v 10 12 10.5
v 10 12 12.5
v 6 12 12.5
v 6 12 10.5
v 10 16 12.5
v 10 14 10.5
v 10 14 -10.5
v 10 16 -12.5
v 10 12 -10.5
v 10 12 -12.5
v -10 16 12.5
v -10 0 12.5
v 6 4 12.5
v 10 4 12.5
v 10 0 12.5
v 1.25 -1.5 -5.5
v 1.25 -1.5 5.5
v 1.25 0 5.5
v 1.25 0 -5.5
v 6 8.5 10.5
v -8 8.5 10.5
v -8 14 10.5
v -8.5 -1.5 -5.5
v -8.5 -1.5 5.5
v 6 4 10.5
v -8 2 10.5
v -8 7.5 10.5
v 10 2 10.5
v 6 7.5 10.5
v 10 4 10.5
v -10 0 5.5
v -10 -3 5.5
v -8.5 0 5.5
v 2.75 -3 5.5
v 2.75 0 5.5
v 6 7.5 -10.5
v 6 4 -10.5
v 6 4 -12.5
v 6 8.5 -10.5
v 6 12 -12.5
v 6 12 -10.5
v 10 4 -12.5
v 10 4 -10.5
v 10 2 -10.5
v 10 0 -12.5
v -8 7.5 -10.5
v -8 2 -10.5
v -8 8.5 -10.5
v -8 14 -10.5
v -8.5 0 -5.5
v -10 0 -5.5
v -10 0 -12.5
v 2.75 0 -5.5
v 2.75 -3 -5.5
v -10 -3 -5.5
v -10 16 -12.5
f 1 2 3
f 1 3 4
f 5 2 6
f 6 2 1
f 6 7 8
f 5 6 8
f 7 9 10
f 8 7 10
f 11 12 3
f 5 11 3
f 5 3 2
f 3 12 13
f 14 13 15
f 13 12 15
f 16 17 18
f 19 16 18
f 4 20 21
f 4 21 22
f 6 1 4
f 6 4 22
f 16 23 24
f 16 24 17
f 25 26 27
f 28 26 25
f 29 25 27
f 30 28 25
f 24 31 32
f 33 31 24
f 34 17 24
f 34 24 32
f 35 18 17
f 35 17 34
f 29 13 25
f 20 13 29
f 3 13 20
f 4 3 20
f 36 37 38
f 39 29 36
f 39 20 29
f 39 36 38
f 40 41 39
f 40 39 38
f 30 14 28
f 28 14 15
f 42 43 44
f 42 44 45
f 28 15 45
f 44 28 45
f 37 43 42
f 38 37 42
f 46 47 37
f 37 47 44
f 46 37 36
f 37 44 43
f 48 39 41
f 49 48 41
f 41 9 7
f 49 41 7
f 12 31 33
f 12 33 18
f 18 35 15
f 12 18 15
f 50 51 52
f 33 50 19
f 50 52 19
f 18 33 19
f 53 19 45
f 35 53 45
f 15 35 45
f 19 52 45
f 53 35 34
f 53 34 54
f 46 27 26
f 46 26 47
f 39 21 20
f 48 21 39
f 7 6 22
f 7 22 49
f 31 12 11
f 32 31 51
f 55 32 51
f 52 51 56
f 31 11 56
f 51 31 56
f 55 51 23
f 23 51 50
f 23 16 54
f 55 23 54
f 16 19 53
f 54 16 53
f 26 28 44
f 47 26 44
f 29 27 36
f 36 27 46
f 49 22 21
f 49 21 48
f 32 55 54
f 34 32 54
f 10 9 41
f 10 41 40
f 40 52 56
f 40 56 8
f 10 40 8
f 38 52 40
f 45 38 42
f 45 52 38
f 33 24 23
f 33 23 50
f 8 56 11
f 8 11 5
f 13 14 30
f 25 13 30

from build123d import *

# Parameters (mm, degrees)
CROQUIS1_W              = 20
CROQUIS1_H              = 25
SALIENTE_EXTRUIR4_DEPTH = 16
CORTAR_EXTRUIR1_START   = 10
CROQUIS4_W              = 21
CROQUIS4_H              = 12
CORTAR_EXTRUIR1_DEPTH   = 18
SALIENTE_EXTRUIR6_START = -10
CROQUIS5_W              = 21
CROQUIS5_H              = 1
SALIENTE_EXTRUIR6_DEPTH = 16
SALIENTE_EXTRUIR7_START = 10
CROQUIS7_W              = 2
CROQUIS7_H              = 8
SALIENTE_EXTRUIR7_DEPTH = 4
CORTAR_EXTRUIR2_START   = 14
CROQUIS7_2_W            = 2
CROQUIS7_2_H            = 8
CORTAR_EXTRUIR2_DEPTH   = 8
CROQUIS8_W              = 12.75
CROQUIS8_H              = 11
SALIENTE_EXTRUIR8_DEPTH = 3
CROQUIS9_W              = 9.75
CROQUIS9_H              = 1.5
CORTAR_EXTRUIR4_DEPTH   = 21.5


with BuildPart() as part:
    # Croquis1 → Saliente-Extruir4 (new body)
    with BuildSketch(Plane(origin=(0, 0, 0), x_dir=(1, 0, 0), z_dir=(0, 1, 0))):
        Rectangle(CROQUIS1_W, CROQUIS1_H)
    extrude(amount=SALIENTE_EXTRUIR4_DEPTH)

    # Croquis4 → Cortar-Extruir1 (cut)
    with BuildSketch(Plane(origin=(0, 0, 0), x_dir=(0, 0, -1), z_dir=(1, 0, 0)).offset(CORTAR_EXTRUIR1_START)):
        with Locations((0, 8)):
            Rectangle(CROQUIS4_W, CROQUIS4_H)
    extrude(amount=-CORTAR_EXTRUIR1_DEPTH, mode=Mode.SUBTRACT)

    # Croquis5 → Saliente-Extruir6 (add)
    with BuildSketch(Plane(origin=(0, 0, 0), x_dir=(0, 0, -1), z_dir=(1, 0, 0)).offset(SALIENTE_EXTRUIR6_START)):
        with Locations((0, 8)):
            Rectangle(CROQUIS5_W, CROQUIS5_H)
    extrude(amount=SALIENTE_EXTRUIR6_DEPTH)

    # Croquis7 → Saliente-Extruir7 (add)
    with BuildSketch(Plane(origin=(0, 0, 0), x_dir=(0, 0, -1), z_dir=(1, 0, 0)).offset(SALIENTE_EXTRUIR7_START)):
        with Locations((-11.5, 8)):
            Rectangle(CROQUIS7_W, CROQUIS7_H)
        with Locations((11.5, 8)):
            Rectangle(CROQUIS7_W, CROQUIS7_H)
    extrude(amount=SALIENTE_EXTRUIR7_DEPTH)

    # Croquis7<2> → Cortar-Extruir2 (cut)
    with BuildSketch(Plane(origin=(0, 0, 0), x_dir=(0, 0, -1), z_dir=(1, 0, 0)).offset(CORTAR_EXTRUIR2_START)):
        with Locations((-11.5, 8)):
            Rectangle(CROQUIS7_2_W, CROQUIS7_2_H)
        with Locations((11.5, 8)):
            Rectangle(CROQUIS7_2_W, CROQUIS7_2_H)
    extrude(amount=-CORTAR_EXTRUIR2_DEPTH, mode=Mode.SUBTRACT)

    # Croquis8 → Saliente-Extruir8 (add)
    with BuildSketch(Plane(origin=(0, 0, 0), x_dir=(1, 0, 0), z_dir=(0, 1, 0))):
        with Locations((-3.625, 0)):
            Rectangle(CROQUIS8_W, CROQUIS8_H)
    extrude(amount=-SALIENTE_EXTRUIR8_DEPTH)

    # Croquis9 → Cortar-Extruir4 (cut, symmetric)
    with BuildSketch(Plane.XY):
        with Locations((-3.625, -0.75)):
            Rectangle(CROQUIS9_W, CROQUIS9_H)
    extrude(amount=CORTAR_EXTRUIR4_DEPTH, both=True, mode=Mode.SUBTRACT)


solid = part.part
